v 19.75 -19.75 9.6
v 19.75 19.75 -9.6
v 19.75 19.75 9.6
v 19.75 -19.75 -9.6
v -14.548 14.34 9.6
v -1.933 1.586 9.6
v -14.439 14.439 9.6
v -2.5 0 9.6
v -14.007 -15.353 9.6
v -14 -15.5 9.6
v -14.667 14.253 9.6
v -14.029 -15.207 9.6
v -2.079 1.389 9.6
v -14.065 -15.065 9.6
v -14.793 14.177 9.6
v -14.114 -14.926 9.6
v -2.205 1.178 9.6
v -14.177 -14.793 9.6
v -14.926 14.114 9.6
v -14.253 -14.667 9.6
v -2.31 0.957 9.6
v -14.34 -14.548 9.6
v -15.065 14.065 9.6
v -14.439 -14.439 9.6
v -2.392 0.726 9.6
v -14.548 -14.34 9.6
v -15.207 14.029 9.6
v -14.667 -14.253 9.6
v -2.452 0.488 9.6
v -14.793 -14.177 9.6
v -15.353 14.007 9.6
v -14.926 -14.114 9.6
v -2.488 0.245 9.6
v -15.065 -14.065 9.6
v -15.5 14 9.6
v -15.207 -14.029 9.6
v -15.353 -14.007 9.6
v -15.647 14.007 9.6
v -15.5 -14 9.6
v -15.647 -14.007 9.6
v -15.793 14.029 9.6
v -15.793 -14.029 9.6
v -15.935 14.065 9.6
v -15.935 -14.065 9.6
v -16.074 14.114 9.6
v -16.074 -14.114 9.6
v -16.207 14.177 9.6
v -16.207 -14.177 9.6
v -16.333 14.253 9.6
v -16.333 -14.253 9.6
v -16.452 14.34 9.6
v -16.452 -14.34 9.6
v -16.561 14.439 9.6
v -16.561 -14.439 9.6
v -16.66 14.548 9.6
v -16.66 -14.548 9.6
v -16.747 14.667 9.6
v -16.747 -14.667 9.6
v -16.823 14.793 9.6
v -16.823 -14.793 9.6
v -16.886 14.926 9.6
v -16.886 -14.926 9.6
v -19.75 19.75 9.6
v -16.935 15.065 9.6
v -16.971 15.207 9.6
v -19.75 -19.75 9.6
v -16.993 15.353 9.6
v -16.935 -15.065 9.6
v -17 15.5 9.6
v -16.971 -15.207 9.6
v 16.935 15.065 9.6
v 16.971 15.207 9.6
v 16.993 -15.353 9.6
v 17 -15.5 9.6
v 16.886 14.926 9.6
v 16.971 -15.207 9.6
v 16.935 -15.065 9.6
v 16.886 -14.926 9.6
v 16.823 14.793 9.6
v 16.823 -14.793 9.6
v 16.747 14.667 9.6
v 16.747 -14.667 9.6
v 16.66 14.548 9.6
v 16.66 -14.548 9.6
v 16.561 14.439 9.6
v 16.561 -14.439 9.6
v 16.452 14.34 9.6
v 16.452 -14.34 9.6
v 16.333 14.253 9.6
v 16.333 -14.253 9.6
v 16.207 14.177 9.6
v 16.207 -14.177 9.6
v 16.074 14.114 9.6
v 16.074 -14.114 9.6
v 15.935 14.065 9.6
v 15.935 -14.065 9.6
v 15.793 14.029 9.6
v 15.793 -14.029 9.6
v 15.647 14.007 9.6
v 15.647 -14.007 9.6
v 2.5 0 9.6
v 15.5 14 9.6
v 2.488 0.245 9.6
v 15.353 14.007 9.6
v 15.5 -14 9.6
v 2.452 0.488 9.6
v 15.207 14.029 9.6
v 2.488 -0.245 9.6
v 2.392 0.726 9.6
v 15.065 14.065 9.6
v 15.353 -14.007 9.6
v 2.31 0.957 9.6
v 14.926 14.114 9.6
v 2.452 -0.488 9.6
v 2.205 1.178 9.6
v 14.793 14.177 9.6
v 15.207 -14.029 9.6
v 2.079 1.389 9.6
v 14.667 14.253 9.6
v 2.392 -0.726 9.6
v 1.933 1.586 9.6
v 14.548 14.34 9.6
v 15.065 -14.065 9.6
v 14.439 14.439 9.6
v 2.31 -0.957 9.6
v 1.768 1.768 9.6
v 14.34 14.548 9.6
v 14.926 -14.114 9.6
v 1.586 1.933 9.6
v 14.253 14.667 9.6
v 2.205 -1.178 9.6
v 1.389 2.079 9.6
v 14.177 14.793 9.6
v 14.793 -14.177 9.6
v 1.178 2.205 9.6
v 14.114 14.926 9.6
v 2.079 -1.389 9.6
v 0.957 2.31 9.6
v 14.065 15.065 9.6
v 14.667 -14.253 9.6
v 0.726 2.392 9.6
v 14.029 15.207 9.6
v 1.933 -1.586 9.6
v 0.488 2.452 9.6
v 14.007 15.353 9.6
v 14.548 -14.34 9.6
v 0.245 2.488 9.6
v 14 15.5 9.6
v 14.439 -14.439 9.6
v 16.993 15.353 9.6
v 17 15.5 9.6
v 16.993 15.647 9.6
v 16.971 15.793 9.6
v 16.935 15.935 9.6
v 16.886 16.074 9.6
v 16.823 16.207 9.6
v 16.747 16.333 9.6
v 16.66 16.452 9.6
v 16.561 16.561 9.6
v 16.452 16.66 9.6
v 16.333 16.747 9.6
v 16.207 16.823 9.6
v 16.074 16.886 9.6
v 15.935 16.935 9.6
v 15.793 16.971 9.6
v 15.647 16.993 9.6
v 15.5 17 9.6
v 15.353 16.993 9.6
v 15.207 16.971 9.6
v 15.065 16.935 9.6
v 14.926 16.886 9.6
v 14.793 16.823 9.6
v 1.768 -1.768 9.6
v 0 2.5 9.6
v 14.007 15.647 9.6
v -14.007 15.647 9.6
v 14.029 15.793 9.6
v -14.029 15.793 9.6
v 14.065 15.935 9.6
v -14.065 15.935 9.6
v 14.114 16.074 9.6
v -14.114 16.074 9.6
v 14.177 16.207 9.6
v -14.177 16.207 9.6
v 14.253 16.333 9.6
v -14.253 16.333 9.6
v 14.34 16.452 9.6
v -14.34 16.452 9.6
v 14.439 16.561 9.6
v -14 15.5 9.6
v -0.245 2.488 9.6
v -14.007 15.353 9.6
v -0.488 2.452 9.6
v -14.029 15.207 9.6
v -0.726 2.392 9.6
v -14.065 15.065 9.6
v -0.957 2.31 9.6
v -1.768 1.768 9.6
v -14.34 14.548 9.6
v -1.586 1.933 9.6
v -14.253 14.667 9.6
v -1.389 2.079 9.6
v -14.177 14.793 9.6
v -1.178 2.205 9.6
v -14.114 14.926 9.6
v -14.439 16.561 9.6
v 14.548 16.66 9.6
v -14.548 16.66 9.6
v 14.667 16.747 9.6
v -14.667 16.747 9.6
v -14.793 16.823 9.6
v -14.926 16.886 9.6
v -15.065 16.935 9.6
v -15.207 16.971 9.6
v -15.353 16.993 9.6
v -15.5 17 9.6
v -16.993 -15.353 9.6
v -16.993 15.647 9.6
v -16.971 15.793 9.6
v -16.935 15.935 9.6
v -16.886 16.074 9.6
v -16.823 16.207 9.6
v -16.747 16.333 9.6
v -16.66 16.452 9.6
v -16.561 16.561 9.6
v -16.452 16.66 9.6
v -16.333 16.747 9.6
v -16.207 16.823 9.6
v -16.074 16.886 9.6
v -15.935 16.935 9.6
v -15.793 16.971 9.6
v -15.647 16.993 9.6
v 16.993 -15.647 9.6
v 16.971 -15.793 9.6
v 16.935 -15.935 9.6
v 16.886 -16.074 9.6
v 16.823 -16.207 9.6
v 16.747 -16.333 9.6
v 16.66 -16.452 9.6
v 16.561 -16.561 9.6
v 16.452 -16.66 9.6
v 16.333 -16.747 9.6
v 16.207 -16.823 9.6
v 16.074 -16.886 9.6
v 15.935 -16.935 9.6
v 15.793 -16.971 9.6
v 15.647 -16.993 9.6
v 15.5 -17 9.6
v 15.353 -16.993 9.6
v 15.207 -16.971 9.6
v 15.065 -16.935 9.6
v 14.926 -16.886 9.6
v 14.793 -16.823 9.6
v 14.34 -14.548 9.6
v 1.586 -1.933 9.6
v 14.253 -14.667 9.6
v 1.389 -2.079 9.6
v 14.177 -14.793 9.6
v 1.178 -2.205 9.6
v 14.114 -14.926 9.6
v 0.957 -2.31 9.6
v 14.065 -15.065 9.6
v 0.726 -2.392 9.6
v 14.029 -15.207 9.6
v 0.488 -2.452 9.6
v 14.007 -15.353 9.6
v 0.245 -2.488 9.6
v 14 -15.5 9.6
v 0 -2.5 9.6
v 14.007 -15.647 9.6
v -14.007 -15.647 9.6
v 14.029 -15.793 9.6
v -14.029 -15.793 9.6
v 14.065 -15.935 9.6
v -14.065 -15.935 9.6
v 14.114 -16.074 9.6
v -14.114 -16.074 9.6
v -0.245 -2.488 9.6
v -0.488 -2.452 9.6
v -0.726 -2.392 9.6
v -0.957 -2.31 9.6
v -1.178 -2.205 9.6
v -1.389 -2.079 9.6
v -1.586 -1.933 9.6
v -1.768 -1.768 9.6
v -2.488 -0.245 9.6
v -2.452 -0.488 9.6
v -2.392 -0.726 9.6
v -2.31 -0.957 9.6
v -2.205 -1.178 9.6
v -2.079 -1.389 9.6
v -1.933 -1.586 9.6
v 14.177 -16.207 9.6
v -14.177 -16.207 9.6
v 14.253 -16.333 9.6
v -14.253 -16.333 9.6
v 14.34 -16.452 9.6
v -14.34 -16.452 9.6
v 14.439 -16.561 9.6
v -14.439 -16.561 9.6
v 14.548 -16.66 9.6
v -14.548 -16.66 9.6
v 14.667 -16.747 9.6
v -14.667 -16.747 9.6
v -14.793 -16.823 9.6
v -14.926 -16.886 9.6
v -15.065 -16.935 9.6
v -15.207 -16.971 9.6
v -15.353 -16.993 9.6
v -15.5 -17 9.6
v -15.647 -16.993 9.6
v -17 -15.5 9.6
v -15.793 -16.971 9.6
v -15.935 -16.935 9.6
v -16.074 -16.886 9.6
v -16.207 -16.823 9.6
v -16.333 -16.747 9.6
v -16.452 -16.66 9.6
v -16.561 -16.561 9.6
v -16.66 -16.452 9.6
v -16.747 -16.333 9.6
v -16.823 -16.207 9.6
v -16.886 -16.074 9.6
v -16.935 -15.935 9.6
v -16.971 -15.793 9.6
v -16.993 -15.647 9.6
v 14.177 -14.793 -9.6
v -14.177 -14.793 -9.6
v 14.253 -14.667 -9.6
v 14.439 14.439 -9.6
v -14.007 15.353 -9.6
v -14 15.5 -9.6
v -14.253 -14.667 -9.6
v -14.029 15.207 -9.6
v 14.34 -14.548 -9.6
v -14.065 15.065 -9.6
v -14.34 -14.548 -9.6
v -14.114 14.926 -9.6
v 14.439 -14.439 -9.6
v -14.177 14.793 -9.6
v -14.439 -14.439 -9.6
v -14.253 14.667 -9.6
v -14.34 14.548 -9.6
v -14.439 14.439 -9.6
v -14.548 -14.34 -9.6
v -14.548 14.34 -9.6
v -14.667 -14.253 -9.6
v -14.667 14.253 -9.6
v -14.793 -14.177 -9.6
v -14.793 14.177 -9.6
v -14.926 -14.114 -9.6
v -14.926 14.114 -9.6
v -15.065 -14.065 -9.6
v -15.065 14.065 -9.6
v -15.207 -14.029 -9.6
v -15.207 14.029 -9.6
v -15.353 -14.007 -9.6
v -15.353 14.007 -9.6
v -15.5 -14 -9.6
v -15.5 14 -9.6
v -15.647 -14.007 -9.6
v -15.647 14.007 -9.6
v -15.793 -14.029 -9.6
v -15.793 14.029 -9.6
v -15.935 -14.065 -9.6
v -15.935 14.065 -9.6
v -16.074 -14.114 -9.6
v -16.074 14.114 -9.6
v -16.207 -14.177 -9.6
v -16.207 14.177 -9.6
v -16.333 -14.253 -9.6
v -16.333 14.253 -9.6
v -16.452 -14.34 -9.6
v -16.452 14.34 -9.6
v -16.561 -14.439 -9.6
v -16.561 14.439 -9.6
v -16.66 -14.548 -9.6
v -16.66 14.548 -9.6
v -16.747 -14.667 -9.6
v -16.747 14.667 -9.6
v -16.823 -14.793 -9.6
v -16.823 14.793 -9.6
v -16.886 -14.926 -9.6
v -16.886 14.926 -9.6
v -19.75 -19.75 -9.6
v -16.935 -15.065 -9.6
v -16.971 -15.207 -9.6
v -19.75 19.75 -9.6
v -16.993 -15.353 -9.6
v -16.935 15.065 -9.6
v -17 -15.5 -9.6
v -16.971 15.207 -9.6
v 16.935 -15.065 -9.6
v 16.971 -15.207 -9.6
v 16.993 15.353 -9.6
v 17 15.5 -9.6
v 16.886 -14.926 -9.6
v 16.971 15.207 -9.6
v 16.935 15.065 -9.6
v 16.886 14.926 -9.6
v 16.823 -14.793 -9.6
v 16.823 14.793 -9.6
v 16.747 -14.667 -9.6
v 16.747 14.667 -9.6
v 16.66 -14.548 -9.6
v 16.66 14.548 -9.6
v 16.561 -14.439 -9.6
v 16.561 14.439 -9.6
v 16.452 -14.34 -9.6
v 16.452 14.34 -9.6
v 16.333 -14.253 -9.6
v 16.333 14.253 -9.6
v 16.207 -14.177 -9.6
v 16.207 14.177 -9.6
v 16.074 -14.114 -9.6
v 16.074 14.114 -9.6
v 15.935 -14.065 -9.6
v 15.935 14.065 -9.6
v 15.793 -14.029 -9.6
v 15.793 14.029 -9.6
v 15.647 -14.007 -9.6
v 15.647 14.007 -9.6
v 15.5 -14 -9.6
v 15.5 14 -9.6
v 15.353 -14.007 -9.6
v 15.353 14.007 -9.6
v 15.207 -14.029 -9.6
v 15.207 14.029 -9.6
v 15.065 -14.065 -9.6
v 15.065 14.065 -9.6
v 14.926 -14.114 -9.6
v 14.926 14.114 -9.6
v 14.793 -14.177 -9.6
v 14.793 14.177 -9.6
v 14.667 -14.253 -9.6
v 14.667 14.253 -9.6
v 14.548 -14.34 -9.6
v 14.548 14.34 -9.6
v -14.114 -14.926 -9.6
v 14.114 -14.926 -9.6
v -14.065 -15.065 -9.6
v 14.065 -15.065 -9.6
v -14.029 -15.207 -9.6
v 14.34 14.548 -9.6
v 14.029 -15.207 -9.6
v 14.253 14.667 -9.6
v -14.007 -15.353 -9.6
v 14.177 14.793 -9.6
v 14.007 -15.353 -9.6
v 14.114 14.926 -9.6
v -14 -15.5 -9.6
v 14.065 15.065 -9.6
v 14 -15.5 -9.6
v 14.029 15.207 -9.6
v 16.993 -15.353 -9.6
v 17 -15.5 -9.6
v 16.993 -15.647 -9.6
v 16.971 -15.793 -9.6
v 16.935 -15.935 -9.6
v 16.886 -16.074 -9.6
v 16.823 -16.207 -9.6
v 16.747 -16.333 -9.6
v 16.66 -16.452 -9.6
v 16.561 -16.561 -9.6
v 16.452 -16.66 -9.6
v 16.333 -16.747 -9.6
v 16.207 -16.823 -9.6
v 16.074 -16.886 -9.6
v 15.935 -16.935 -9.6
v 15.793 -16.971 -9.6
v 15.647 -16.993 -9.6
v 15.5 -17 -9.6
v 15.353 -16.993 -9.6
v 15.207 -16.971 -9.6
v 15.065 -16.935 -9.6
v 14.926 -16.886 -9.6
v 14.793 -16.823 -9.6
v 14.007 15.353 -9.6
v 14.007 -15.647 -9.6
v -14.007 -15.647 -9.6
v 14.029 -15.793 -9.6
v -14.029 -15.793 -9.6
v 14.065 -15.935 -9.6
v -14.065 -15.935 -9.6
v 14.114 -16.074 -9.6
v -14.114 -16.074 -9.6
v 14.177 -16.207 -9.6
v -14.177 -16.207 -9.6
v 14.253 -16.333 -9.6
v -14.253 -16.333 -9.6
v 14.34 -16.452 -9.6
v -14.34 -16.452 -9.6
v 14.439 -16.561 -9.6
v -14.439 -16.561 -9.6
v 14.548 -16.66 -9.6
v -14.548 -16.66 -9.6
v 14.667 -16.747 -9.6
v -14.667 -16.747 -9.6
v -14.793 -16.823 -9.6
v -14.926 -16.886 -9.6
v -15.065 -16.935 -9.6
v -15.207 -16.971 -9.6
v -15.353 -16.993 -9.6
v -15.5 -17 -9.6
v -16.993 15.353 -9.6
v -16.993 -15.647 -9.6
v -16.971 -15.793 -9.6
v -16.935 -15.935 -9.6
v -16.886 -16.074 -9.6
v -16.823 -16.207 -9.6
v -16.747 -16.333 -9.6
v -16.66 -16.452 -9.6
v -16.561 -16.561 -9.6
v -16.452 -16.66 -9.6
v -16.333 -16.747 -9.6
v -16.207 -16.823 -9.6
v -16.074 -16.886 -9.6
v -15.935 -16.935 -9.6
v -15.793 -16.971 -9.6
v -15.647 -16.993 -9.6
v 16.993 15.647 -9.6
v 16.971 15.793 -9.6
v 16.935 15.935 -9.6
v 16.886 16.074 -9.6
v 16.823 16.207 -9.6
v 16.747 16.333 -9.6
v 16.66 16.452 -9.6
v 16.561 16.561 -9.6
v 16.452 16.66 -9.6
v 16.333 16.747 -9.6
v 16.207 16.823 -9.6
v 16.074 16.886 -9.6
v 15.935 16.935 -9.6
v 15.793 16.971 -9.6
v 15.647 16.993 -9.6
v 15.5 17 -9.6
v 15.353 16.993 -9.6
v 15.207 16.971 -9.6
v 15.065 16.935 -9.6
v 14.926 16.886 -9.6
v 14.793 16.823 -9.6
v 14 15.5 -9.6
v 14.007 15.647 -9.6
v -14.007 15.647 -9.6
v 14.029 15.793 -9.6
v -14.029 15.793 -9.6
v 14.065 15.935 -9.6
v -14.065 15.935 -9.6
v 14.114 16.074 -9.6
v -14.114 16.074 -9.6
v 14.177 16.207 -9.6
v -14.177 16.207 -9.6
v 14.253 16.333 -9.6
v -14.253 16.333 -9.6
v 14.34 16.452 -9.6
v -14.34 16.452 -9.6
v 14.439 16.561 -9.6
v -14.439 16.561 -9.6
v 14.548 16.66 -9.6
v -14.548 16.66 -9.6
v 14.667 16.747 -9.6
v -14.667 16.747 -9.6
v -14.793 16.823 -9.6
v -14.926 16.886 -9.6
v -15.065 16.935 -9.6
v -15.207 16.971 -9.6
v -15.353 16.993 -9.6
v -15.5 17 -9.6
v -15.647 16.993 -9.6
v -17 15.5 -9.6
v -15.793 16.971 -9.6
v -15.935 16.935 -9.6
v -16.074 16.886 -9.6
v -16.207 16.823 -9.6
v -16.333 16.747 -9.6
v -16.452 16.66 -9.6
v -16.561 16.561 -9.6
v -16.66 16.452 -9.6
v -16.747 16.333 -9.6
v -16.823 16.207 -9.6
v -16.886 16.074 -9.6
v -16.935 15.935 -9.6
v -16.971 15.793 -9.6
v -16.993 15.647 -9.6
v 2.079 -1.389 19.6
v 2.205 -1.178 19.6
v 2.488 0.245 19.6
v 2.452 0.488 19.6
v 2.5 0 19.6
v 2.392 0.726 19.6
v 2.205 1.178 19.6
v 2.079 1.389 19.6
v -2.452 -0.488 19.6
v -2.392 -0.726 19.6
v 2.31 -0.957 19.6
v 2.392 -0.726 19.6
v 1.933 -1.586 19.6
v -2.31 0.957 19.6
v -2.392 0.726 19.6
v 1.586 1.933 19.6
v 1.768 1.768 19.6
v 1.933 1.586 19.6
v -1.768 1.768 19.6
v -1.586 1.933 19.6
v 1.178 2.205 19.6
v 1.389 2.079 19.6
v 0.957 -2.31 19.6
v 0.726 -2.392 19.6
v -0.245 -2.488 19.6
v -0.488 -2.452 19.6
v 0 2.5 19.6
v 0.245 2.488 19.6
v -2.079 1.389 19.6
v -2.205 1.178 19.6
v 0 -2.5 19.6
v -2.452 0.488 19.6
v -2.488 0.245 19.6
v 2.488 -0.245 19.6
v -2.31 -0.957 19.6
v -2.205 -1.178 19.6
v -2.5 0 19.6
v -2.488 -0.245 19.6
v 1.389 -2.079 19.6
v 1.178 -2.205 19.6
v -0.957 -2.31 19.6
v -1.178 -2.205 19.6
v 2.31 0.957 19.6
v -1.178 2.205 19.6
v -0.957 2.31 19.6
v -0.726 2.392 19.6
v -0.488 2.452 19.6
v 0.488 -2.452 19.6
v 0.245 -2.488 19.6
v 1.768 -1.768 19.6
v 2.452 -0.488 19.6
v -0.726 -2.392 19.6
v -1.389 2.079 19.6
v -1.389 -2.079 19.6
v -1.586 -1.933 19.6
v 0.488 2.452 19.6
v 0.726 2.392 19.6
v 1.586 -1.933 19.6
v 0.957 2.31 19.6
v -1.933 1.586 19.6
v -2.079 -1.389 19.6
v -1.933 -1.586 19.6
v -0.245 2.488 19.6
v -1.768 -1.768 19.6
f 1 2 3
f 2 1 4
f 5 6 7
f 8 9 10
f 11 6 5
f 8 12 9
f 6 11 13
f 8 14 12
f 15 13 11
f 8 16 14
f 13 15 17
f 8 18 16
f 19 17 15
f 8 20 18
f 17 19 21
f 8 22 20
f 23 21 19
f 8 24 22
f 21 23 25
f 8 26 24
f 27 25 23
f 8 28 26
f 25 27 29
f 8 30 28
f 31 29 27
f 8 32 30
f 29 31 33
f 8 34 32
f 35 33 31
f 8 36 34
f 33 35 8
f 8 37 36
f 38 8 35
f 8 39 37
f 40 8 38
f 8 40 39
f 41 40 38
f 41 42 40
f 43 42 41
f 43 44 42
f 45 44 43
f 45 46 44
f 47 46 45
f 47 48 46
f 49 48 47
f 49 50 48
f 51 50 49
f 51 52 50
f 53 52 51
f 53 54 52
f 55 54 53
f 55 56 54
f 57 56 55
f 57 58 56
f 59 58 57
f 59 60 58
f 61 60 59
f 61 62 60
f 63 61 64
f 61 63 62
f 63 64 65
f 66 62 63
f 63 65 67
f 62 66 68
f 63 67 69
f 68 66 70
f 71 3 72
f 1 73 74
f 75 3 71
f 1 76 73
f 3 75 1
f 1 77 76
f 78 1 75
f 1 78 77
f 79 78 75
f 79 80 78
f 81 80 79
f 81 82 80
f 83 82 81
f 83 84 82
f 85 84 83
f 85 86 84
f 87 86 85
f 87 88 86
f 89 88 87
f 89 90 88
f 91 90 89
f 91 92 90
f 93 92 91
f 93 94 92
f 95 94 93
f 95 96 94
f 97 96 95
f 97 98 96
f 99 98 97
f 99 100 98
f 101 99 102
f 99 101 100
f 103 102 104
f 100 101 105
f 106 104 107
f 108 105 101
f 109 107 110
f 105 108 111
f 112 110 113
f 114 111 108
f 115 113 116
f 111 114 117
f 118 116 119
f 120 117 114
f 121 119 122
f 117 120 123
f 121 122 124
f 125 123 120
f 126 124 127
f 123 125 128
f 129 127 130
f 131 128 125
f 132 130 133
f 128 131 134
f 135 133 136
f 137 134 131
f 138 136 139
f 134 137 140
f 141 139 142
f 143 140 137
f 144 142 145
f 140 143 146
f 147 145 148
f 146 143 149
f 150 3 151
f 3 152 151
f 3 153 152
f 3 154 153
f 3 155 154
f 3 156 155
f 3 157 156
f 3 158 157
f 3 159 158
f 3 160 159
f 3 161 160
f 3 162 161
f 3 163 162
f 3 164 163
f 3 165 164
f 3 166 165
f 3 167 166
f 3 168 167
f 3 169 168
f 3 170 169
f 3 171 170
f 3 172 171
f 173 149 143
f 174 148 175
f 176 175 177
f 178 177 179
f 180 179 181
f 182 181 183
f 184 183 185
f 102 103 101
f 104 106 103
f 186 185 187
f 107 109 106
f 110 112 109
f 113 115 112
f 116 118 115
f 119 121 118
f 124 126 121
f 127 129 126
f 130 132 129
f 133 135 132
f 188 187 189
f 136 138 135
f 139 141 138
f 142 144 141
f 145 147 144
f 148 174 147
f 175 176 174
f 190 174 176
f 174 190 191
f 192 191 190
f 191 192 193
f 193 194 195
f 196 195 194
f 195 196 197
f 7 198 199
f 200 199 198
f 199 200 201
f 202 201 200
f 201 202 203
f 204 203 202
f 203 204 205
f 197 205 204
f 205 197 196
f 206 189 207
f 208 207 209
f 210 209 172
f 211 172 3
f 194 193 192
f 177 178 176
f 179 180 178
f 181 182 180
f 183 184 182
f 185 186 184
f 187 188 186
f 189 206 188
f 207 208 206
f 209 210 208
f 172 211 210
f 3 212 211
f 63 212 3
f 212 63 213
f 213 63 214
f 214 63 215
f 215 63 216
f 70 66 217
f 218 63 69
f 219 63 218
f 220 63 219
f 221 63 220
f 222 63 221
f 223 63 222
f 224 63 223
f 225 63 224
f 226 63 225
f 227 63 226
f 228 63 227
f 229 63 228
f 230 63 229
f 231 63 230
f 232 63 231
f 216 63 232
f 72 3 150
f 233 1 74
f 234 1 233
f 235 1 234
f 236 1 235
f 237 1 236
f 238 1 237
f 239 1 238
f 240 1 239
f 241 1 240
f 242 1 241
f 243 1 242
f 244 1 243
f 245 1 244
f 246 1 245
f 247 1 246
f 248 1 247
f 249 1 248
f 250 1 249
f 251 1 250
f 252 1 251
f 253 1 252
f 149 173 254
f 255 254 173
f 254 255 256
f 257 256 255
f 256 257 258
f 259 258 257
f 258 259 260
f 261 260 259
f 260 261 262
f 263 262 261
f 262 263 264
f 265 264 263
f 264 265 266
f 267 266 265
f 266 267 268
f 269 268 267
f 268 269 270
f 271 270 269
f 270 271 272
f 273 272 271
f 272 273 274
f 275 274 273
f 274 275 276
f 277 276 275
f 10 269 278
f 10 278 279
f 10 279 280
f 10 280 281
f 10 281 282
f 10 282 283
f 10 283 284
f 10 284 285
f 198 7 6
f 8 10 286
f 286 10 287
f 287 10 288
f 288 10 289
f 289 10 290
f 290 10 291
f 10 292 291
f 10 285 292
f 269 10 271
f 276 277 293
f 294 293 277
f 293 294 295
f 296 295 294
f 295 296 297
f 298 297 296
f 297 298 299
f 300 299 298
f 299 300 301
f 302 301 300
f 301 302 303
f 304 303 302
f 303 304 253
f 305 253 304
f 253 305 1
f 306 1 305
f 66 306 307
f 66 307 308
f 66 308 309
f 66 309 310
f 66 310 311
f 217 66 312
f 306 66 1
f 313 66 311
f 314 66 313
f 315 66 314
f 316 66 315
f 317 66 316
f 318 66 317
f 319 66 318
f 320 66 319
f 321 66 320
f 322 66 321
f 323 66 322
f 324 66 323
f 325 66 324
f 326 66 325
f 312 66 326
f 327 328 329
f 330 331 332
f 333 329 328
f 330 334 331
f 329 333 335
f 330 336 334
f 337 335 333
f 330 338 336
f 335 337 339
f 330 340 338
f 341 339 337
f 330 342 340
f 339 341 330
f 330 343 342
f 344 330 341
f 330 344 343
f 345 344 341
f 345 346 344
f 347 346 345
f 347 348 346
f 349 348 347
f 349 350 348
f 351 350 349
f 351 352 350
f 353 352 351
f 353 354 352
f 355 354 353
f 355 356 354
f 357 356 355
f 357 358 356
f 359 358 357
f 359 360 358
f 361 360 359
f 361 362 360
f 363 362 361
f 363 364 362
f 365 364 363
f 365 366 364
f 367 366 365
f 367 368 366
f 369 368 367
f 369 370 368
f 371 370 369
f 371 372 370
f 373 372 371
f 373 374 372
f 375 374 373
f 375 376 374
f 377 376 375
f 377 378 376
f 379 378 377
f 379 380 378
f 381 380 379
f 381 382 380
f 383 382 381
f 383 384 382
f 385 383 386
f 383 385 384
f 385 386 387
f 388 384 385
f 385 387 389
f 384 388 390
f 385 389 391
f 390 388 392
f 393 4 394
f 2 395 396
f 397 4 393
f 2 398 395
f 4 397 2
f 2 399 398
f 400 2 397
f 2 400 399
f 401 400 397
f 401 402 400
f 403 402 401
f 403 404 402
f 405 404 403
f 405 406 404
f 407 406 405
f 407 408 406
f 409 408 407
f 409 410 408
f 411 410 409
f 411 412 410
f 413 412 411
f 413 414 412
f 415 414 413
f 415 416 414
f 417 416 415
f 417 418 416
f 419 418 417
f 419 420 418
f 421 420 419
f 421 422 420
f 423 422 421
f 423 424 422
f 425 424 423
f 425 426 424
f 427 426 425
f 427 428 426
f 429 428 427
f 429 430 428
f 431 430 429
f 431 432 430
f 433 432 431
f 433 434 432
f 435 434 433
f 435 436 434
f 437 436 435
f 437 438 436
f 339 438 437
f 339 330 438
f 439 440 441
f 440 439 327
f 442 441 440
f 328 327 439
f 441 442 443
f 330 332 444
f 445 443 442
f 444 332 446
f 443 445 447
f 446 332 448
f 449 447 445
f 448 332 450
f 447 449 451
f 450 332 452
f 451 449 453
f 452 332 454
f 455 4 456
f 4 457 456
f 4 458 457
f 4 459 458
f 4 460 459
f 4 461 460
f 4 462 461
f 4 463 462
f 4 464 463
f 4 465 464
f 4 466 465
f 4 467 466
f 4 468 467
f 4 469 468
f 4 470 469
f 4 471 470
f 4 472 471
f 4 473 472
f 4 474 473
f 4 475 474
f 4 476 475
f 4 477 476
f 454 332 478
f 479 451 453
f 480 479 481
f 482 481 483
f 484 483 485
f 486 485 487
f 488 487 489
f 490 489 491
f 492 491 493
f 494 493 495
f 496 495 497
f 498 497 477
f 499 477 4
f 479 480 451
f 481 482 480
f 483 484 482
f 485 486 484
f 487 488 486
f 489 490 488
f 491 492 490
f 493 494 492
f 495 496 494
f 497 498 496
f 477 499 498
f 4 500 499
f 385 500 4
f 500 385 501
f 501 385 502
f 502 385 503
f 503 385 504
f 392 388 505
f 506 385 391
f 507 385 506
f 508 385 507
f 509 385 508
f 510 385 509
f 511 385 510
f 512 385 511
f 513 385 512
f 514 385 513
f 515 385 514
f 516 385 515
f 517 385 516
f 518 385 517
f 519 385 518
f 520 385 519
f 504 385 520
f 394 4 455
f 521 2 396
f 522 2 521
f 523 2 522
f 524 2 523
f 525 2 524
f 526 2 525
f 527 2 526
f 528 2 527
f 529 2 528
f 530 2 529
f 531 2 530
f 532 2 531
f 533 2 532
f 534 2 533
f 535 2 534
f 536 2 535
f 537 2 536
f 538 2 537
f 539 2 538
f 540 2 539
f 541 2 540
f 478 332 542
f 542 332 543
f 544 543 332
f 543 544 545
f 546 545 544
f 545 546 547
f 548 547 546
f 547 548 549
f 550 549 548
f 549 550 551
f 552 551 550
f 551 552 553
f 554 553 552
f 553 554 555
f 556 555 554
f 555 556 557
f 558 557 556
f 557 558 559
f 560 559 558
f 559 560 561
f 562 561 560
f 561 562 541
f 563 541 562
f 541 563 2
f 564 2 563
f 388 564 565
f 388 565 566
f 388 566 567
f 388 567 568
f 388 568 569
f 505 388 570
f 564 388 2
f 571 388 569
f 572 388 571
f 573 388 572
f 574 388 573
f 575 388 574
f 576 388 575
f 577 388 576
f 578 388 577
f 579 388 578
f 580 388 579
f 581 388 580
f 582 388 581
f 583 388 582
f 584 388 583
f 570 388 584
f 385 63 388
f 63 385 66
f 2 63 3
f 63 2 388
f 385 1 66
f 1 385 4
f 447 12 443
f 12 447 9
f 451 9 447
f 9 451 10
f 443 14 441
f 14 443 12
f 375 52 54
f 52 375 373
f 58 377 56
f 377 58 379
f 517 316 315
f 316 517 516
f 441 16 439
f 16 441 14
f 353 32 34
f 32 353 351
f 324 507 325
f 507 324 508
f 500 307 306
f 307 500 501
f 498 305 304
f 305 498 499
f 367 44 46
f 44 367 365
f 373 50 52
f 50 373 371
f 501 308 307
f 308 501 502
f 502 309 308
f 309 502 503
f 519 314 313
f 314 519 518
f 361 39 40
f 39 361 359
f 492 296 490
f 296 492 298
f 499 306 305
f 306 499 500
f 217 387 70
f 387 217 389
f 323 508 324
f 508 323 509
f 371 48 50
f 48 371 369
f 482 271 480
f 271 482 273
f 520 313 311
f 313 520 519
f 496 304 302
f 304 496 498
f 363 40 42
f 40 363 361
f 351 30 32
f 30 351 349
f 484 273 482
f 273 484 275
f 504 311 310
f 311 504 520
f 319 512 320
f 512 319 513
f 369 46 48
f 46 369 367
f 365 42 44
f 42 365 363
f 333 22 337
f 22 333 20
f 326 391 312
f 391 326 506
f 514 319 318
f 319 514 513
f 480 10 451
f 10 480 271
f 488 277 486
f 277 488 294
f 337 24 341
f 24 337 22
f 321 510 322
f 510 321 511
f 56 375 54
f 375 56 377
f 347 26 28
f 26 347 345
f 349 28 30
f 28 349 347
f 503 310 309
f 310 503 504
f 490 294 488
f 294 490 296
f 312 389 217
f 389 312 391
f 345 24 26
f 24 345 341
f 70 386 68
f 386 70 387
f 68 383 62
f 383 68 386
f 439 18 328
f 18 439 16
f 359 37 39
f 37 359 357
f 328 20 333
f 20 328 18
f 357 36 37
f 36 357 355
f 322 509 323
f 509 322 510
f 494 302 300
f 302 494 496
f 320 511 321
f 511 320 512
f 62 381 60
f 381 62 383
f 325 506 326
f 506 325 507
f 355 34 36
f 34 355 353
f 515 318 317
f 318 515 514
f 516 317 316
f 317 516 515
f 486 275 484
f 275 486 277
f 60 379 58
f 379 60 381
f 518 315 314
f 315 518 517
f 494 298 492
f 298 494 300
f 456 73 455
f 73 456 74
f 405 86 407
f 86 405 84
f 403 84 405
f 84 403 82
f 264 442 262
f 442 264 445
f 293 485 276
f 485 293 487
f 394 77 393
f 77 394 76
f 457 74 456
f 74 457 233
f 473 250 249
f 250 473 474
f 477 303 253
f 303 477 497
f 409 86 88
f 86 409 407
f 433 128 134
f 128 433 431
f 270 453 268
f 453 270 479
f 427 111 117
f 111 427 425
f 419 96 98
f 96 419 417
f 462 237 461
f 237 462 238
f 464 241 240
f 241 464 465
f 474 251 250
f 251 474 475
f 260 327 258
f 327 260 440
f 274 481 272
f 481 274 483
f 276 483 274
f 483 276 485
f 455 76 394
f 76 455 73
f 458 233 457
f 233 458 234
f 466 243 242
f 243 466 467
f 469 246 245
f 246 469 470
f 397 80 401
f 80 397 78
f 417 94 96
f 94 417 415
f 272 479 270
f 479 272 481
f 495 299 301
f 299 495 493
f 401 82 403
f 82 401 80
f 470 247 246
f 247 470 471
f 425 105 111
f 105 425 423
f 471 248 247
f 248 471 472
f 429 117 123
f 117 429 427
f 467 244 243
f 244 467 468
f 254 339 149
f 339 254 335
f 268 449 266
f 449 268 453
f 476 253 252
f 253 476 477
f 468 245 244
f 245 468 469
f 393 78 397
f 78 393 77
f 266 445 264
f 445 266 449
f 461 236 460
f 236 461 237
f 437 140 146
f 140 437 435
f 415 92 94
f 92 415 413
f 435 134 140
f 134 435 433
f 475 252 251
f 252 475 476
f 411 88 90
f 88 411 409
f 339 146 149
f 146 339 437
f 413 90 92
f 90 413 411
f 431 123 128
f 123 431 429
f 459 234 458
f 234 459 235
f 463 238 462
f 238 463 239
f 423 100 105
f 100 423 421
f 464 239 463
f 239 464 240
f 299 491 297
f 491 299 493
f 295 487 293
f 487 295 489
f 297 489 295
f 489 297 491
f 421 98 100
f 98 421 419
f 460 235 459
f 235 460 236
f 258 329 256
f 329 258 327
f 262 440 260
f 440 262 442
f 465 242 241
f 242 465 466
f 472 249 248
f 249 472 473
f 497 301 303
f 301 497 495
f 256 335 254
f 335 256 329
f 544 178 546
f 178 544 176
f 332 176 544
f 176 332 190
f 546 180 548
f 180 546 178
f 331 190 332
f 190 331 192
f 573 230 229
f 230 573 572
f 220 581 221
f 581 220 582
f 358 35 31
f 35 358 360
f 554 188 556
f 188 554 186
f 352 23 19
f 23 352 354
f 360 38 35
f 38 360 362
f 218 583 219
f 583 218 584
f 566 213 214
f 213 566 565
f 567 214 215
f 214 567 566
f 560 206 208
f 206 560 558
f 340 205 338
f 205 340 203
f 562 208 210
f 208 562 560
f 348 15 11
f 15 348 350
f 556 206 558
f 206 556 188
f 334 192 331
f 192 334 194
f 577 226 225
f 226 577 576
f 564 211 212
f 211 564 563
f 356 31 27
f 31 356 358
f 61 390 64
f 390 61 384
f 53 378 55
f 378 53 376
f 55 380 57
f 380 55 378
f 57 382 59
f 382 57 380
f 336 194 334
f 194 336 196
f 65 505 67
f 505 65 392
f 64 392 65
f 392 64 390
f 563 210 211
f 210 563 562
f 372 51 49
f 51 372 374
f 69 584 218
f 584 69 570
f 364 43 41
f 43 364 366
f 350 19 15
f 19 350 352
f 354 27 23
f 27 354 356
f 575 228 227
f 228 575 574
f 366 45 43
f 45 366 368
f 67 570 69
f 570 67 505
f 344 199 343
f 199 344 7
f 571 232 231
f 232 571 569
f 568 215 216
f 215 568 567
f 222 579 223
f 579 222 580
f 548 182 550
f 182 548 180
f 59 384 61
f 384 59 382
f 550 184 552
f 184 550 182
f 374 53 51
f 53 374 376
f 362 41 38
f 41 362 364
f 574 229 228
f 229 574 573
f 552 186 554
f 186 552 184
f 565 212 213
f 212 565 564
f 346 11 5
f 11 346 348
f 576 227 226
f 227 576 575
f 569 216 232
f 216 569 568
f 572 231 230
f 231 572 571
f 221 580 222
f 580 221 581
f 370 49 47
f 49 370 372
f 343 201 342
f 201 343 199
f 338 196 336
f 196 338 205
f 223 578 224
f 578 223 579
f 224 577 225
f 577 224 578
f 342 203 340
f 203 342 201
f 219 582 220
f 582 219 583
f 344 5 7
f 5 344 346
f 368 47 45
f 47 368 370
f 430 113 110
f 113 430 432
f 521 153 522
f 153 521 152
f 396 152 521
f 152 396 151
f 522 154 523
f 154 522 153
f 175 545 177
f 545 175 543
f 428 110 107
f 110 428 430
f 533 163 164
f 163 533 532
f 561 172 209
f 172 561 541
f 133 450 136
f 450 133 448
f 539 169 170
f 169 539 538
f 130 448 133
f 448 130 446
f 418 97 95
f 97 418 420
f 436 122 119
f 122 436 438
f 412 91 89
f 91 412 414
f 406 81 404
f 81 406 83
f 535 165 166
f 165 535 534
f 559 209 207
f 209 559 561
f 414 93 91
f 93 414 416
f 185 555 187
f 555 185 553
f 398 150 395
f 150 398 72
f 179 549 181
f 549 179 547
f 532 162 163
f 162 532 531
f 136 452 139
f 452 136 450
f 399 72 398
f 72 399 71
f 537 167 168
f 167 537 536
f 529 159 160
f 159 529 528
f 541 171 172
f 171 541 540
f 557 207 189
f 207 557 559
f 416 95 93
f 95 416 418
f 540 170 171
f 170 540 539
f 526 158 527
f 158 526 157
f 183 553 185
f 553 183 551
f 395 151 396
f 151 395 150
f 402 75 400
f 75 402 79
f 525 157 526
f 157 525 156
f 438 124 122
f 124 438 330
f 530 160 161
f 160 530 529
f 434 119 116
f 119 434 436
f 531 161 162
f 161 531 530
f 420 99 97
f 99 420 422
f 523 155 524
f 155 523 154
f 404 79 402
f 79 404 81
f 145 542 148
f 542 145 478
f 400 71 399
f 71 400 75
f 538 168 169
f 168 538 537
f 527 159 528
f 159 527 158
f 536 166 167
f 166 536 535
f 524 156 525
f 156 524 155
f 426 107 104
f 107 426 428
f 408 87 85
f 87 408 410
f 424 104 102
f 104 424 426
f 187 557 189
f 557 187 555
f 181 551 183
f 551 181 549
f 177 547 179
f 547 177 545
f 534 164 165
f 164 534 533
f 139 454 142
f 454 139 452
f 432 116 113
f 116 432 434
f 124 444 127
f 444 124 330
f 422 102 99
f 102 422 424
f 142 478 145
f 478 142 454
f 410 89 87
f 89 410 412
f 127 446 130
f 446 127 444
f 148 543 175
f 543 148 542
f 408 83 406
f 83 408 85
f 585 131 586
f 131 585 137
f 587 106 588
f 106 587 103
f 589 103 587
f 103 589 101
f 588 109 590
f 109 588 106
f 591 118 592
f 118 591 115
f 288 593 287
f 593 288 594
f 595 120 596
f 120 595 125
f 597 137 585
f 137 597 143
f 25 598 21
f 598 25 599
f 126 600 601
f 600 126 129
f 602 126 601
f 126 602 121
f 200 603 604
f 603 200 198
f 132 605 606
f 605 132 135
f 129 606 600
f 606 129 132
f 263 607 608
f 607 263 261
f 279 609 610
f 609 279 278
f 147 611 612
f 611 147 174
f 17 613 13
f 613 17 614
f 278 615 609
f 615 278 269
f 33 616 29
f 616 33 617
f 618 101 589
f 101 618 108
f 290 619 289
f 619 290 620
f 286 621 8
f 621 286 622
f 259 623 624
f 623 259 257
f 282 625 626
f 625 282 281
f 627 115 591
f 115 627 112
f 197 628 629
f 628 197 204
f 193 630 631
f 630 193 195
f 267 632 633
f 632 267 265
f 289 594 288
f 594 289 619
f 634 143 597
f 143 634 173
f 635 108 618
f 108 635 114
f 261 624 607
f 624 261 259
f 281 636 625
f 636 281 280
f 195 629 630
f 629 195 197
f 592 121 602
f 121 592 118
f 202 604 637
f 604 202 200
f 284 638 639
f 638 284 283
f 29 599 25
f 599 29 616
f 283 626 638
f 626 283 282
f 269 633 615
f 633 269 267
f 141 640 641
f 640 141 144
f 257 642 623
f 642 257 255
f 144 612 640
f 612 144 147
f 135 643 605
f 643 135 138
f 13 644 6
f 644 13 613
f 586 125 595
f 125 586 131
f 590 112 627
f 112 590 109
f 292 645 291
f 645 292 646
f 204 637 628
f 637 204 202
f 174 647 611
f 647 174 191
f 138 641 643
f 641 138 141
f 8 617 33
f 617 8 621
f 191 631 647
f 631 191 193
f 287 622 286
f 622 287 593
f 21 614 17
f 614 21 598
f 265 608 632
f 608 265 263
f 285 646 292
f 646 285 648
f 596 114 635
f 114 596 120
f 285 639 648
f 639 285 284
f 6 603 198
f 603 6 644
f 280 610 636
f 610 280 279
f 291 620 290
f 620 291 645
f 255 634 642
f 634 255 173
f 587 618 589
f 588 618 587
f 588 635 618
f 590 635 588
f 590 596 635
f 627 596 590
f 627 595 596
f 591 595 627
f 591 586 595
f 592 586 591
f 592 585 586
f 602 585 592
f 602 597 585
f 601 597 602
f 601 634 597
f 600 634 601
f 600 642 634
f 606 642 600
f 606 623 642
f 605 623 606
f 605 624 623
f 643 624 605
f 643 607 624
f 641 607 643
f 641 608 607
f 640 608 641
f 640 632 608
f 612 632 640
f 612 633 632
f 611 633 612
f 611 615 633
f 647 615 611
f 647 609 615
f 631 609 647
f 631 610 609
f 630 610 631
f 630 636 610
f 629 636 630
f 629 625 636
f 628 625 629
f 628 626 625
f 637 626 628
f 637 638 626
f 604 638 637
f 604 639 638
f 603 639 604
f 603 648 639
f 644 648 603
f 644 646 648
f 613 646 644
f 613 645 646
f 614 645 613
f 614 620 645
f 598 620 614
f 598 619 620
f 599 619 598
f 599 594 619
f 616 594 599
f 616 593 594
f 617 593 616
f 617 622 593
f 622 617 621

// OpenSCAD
module stepper_motor() {
    // Motor body
    difference() {
        cube([39.5, 39.5, 19.2], center=true);
        // Mounting holes
        translate([-15.5, -15.5, 0])
            cylinder(h=19.2, d=3, center=true, $fn=64);
        translate([15.5, -15.5, 0])
            cylinder(h=19.2, d=3, center=true, $fn=64);
        translate([-15.5, 15.5, 0])
            cylinder(h=19.2, d=3, center=true, $fn=64);
        translate([15.5, 15.5, 0])
            cylinder(h=19.2, d=3, center=true, $fn=64);
    }
    
    // Shaft
    translate([0, 0, 9.6])
        cylinder(h=10, d=5, center=false, $fn=64);
}

stepper_motor();
